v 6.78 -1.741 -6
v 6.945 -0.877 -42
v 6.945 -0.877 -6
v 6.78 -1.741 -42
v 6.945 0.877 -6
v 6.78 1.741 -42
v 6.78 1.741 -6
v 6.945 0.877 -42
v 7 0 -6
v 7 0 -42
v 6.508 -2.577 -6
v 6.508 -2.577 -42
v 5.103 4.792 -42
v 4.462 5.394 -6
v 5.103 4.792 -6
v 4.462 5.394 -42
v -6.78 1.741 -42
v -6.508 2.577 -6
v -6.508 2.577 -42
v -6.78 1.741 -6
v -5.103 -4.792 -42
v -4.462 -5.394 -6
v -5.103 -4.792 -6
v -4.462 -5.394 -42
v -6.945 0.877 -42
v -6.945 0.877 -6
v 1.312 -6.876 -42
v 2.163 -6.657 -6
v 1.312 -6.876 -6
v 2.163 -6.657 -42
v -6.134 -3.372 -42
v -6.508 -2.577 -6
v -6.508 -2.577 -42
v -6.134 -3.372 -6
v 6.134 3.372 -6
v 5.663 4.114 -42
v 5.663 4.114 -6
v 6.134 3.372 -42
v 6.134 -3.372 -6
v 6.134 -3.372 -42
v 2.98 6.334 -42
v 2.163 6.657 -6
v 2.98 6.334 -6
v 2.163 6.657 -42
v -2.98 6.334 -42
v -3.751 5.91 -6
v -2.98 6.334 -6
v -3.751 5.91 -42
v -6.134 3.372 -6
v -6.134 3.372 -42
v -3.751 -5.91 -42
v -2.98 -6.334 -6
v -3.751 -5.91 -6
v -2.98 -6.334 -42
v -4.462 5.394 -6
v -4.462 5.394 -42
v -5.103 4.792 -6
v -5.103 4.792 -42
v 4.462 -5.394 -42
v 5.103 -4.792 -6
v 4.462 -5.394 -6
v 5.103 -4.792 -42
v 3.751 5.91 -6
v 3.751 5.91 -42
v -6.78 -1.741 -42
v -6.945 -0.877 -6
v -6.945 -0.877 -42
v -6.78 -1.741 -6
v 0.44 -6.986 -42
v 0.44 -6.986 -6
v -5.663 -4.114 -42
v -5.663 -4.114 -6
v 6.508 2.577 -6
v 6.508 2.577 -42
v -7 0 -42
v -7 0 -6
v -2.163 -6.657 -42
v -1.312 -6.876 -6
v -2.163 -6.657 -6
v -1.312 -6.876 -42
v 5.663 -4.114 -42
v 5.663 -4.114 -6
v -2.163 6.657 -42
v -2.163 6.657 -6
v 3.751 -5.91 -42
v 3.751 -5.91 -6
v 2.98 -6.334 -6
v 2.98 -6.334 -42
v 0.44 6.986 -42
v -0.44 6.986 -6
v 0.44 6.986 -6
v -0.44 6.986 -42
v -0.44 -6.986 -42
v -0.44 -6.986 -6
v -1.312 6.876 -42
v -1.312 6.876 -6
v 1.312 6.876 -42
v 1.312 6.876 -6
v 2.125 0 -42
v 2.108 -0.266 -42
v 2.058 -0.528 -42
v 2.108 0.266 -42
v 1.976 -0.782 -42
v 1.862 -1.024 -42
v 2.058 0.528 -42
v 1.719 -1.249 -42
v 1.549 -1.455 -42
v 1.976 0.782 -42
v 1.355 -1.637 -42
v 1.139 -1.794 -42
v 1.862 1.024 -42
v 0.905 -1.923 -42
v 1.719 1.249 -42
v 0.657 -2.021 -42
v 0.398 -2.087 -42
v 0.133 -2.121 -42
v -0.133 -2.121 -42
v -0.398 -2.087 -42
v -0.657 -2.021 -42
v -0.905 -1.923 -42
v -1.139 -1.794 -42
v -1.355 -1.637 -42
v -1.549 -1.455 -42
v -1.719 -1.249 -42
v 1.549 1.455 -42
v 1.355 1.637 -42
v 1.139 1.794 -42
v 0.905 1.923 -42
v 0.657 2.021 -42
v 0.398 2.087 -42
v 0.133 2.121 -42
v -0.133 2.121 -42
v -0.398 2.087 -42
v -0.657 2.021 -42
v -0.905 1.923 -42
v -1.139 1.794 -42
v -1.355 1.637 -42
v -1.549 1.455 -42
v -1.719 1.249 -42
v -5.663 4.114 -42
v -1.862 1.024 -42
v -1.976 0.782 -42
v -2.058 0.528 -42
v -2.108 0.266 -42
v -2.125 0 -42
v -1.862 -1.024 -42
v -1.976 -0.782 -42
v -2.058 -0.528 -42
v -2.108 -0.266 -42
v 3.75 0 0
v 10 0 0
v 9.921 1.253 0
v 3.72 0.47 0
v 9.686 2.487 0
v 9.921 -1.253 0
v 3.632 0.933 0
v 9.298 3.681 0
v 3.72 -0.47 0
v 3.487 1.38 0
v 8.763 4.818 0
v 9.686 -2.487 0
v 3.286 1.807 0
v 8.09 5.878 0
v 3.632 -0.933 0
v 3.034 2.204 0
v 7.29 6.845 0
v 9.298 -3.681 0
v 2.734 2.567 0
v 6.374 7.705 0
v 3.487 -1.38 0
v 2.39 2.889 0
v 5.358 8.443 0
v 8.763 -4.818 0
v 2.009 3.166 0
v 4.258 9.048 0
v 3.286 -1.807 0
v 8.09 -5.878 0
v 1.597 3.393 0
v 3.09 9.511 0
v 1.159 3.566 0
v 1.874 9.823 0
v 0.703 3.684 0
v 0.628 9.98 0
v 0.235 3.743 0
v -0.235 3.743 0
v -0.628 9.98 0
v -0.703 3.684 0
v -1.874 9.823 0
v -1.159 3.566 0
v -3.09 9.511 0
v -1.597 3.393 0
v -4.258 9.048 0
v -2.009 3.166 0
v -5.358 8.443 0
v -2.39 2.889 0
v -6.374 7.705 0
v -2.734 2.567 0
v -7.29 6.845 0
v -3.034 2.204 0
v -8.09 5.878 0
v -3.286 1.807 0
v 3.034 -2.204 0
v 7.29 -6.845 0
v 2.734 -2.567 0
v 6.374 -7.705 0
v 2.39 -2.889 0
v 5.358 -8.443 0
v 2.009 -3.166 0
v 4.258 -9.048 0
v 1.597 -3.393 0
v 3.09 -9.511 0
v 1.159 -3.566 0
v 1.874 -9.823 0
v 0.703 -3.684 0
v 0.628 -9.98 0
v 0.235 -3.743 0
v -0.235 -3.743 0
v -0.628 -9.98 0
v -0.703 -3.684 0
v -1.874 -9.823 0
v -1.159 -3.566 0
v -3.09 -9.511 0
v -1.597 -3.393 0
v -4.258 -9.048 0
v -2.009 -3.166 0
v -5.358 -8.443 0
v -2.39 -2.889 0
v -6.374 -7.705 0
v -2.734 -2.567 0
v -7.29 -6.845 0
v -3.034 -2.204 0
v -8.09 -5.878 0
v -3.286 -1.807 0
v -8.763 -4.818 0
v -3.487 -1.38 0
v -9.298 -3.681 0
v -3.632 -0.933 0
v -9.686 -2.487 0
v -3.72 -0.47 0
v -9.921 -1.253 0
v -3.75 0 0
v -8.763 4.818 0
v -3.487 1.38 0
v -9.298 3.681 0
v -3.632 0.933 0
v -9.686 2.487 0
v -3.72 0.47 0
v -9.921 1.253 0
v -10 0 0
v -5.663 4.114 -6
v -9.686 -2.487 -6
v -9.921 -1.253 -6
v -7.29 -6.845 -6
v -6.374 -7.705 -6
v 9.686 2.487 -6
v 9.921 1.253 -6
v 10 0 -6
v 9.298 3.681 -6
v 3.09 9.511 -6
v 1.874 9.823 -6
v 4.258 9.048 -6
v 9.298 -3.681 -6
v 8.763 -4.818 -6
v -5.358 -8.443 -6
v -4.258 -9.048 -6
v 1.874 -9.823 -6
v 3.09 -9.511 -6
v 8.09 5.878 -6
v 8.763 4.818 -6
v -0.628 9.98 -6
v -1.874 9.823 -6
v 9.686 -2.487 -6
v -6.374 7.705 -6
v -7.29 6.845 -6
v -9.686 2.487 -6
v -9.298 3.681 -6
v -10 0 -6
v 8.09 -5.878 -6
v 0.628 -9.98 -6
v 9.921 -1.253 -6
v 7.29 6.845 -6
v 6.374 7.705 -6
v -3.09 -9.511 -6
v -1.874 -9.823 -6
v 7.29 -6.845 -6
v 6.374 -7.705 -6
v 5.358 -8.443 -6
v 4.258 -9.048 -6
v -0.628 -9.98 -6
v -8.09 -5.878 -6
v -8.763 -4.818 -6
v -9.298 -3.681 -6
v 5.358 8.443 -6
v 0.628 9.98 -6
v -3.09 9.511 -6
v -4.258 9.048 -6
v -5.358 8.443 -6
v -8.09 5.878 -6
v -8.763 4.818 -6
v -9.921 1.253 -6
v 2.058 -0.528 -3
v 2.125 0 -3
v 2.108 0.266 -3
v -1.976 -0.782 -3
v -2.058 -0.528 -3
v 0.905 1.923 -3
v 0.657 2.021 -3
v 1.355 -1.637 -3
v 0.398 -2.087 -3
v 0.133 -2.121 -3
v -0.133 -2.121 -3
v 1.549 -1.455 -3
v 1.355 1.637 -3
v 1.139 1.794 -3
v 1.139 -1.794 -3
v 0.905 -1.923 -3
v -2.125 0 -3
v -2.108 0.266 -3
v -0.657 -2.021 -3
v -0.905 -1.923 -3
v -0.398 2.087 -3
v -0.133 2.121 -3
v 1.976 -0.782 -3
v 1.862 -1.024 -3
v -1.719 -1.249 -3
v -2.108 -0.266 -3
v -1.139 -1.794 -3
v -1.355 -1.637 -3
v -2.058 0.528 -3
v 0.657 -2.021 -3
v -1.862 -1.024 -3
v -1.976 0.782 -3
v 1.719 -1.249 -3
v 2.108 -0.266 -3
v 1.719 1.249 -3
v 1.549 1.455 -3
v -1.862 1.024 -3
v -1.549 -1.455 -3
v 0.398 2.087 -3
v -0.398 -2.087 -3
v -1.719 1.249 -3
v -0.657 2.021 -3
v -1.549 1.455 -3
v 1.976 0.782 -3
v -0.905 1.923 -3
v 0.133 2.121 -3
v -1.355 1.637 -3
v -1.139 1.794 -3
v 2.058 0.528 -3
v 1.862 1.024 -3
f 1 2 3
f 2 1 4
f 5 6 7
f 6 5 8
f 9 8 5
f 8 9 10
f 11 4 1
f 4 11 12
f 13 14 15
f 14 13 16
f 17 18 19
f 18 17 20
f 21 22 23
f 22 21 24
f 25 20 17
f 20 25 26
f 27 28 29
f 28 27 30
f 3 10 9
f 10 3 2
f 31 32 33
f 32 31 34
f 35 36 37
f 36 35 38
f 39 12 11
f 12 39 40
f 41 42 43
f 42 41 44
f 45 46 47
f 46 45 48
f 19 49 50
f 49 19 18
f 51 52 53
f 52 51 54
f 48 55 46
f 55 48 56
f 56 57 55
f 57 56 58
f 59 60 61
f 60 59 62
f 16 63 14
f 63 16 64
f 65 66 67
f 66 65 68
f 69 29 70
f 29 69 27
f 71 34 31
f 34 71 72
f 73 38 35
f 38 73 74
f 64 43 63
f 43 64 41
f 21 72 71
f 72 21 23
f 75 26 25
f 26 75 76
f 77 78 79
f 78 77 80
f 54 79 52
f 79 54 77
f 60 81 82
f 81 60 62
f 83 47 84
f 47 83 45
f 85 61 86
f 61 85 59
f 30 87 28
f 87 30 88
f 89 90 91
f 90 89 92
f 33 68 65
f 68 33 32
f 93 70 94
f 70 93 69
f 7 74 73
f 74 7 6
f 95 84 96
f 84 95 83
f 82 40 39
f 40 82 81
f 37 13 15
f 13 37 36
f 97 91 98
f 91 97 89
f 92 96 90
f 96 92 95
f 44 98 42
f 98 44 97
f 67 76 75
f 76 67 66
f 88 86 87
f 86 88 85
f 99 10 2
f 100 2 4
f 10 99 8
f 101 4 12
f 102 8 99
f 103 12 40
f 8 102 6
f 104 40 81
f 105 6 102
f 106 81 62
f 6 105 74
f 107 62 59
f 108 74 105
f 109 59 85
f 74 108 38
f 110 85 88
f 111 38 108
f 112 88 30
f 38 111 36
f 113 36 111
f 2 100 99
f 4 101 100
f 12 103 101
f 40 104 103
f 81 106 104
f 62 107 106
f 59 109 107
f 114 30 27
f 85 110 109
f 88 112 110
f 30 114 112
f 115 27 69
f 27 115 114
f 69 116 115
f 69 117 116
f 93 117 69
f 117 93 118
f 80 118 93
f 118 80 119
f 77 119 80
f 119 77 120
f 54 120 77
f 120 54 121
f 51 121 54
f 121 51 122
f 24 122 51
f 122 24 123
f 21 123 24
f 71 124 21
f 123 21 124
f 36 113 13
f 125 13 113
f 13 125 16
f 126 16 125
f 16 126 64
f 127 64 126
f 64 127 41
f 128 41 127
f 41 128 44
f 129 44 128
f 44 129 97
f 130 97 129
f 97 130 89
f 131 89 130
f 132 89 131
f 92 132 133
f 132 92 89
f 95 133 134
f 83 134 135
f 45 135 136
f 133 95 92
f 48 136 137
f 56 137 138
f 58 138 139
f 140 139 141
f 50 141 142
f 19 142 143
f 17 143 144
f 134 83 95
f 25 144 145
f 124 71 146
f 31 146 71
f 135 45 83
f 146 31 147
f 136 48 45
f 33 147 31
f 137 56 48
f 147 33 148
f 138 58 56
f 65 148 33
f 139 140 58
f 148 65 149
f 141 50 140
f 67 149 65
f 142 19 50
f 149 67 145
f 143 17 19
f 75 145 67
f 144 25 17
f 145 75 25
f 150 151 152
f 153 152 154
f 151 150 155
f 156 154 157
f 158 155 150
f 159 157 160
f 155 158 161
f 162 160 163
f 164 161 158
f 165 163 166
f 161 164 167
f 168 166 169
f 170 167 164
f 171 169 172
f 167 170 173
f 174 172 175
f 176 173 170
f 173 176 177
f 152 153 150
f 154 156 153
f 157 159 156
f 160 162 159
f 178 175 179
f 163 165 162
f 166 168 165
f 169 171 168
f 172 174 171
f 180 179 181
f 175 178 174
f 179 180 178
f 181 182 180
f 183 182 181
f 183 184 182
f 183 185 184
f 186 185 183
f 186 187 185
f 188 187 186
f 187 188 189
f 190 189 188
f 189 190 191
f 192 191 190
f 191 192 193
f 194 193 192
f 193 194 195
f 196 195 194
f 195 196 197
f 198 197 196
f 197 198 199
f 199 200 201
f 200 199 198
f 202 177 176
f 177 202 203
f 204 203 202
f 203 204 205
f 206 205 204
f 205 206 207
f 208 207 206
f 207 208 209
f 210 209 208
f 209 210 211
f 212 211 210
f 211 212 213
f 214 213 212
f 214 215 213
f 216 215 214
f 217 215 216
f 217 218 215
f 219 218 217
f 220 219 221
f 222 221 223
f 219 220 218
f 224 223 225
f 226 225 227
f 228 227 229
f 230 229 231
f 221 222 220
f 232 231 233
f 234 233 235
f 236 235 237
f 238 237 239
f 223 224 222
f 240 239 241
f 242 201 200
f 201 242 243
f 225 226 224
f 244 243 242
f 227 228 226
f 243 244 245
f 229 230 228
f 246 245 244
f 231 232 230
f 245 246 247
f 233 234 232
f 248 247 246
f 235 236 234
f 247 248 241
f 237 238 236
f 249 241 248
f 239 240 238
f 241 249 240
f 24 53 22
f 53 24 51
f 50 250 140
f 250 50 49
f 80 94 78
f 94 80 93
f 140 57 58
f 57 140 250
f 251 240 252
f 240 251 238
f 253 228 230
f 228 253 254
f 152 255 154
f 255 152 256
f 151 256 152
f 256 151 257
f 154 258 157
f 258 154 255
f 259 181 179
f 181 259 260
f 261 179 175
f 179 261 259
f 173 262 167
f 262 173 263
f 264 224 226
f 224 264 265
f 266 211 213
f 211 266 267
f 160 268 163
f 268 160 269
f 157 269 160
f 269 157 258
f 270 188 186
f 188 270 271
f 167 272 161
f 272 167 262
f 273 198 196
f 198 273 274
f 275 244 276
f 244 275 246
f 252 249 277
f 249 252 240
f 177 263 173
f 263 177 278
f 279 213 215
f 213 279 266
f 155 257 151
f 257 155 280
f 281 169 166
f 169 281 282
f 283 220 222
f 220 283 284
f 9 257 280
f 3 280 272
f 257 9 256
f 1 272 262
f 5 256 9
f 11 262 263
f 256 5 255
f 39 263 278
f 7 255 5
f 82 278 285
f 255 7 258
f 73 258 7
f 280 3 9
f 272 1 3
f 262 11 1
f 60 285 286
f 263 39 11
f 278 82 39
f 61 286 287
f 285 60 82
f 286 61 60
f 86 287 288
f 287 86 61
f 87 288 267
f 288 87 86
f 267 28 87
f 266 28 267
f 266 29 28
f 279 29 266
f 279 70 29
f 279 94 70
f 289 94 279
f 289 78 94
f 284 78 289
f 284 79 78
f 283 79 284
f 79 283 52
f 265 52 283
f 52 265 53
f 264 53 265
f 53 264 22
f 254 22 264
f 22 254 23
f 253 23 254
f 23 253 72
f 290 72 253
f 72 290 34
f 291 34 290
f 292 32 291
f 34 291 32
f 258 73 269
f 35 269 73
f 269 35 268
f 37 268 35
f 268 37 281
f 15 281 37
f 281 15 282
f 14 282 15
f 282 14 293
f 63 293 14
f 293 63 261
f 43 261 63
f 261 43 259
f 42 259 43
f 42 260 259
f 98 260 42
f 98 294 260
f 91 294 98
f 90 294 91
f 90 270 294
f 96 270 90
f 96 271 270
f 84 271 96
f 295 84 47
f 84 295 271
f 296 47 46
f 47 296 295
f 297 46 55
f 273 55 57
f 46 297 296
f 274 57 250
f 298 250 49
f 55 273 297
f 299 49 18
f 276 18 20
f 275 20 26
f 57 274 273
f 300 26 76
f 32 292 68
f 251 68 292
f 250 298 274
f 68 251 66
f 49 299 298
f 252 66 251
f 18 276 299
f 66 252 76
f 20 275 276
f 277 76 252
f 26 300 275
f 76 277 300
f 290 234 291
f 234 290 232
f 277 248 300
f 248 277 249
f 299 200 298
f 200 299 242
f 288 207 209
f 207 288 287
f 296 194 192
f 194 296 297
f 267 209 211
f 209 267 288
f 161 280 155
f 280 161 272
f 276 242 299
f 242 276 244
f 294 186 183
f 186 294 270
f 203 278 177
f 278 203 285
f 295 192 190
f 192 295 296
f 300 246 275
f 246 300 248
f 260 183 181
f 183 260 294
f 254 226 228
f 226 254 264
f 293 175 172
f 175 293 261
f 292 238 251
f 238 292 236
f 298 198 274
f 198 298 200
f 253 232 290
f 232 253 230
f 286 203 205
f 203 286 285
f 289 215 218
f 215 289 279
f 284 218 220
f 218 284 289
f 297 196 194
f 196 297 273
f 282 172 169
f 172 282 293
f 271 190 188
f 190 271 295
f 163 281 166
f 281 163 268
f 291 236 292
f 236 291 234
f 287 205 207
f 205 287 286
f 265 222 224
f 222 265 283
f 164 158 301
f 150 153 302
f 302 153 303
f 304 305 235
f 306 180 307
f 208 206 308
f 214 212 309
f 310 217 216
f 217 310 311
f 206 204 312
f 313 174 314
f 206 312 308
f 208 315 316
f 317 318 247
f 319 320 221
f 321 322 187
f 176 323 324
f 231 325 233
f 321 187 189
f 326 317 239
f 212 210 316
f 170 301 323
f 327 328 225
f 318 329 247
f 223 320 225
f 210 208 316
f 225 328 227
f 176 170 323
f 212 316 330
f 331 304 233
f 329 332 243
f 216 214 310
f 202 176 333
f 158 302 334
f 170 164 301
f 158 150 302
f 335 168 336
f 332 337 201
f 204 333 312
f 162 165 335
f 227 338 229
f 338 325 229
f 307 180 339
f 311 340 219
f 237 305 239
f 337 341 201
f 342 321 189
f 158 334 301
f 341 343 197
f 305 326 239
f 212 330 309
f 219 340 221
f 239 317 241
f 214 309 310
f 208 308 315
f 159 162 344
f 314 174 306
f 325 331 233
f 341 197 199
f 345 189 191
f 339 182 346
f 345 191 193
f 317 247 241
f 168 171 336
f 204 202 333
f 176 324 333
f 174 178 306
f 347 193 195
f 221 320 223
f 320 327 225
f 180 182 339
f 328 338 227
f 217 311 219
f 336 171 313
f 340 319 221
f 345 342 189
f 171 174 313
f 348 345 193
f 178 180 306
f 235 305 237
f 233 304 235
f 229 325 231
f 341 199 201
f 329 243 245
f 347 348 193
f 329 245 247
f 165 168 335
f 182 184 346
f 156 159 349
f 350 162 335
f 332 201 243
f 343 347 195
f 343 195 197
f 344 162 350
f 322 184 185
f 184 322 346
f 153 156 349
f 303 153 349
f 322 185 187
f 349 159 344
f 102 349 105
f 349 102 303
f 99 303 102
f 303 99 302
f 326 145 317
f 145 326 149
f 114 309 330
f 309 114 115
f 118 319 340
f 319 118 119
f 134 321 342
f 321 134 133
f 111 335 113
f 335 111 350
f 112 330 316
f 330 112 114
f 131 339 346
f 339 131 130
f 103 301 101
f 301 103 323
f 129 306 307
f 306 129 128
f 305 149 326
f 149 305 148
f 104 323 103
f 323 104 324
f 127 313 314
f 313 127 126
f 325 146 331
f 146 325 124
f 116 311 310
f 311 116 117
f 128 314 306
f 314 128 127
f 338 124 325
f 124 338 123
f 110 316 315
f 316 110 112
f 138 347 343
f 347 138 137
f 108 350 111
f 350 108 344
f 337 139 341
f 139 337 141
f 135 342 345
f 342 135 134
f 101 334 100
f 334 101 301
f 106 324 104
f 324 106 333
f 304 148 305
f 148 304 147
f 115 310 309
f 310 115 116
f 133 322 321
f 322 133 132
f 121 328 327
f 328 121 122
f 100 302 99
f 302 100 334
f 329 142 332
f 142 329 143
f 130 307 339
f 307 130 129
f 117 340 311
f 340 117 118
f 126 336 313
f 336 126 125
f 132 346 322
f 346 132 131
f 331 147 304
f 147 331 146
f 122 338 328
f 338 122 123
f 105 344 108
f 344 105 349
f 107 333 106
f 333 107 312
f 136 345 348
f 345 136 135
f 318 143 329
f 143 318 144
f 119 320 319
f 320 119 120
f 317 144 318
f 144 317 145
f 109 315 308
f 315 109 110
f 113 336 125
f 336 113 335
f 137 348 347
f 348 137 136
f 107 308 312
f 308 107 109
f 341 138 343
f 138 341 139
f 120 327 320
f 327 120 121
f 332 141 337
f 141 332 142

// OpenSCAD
$fn = 50;


difference() {
	union() {
		translate(v = [0, 0, -42.0000000000]) {
			cylinder(h = 42, r = 7.0000000000);
		}
		translate(v = [0, 0, -6.0000000000]) {
			cylinder(h = 6, r = 10.0000000000);
		}
	}
	union() {
		translate(v = [0, 0, 0]) {
			rotate(a = [0, 0, 0]) {
				difference() {
					union() {
						#translate(v = [0, 0, -42.0000000000]) {
							cylinder(h = 42, r = 2.0000000000);
						}
						#translate(v = [0, 0, -3]) {
							cylinder(h = 3, r = 7.0000000000, r1 = 2.1250000000, r2 = 3.7500000000);
						}
						#translate(v = [0, 0, -42.0000000000]) {
							cylinder(h = 42, r = 2.1250000000);
						}
						#translate(v = [0, 0, -42.0000000000]) {
							cylinder(h = 42, r = 2.0000000000);
						}
					}
					union();
				}
			}
		}
	}
}
